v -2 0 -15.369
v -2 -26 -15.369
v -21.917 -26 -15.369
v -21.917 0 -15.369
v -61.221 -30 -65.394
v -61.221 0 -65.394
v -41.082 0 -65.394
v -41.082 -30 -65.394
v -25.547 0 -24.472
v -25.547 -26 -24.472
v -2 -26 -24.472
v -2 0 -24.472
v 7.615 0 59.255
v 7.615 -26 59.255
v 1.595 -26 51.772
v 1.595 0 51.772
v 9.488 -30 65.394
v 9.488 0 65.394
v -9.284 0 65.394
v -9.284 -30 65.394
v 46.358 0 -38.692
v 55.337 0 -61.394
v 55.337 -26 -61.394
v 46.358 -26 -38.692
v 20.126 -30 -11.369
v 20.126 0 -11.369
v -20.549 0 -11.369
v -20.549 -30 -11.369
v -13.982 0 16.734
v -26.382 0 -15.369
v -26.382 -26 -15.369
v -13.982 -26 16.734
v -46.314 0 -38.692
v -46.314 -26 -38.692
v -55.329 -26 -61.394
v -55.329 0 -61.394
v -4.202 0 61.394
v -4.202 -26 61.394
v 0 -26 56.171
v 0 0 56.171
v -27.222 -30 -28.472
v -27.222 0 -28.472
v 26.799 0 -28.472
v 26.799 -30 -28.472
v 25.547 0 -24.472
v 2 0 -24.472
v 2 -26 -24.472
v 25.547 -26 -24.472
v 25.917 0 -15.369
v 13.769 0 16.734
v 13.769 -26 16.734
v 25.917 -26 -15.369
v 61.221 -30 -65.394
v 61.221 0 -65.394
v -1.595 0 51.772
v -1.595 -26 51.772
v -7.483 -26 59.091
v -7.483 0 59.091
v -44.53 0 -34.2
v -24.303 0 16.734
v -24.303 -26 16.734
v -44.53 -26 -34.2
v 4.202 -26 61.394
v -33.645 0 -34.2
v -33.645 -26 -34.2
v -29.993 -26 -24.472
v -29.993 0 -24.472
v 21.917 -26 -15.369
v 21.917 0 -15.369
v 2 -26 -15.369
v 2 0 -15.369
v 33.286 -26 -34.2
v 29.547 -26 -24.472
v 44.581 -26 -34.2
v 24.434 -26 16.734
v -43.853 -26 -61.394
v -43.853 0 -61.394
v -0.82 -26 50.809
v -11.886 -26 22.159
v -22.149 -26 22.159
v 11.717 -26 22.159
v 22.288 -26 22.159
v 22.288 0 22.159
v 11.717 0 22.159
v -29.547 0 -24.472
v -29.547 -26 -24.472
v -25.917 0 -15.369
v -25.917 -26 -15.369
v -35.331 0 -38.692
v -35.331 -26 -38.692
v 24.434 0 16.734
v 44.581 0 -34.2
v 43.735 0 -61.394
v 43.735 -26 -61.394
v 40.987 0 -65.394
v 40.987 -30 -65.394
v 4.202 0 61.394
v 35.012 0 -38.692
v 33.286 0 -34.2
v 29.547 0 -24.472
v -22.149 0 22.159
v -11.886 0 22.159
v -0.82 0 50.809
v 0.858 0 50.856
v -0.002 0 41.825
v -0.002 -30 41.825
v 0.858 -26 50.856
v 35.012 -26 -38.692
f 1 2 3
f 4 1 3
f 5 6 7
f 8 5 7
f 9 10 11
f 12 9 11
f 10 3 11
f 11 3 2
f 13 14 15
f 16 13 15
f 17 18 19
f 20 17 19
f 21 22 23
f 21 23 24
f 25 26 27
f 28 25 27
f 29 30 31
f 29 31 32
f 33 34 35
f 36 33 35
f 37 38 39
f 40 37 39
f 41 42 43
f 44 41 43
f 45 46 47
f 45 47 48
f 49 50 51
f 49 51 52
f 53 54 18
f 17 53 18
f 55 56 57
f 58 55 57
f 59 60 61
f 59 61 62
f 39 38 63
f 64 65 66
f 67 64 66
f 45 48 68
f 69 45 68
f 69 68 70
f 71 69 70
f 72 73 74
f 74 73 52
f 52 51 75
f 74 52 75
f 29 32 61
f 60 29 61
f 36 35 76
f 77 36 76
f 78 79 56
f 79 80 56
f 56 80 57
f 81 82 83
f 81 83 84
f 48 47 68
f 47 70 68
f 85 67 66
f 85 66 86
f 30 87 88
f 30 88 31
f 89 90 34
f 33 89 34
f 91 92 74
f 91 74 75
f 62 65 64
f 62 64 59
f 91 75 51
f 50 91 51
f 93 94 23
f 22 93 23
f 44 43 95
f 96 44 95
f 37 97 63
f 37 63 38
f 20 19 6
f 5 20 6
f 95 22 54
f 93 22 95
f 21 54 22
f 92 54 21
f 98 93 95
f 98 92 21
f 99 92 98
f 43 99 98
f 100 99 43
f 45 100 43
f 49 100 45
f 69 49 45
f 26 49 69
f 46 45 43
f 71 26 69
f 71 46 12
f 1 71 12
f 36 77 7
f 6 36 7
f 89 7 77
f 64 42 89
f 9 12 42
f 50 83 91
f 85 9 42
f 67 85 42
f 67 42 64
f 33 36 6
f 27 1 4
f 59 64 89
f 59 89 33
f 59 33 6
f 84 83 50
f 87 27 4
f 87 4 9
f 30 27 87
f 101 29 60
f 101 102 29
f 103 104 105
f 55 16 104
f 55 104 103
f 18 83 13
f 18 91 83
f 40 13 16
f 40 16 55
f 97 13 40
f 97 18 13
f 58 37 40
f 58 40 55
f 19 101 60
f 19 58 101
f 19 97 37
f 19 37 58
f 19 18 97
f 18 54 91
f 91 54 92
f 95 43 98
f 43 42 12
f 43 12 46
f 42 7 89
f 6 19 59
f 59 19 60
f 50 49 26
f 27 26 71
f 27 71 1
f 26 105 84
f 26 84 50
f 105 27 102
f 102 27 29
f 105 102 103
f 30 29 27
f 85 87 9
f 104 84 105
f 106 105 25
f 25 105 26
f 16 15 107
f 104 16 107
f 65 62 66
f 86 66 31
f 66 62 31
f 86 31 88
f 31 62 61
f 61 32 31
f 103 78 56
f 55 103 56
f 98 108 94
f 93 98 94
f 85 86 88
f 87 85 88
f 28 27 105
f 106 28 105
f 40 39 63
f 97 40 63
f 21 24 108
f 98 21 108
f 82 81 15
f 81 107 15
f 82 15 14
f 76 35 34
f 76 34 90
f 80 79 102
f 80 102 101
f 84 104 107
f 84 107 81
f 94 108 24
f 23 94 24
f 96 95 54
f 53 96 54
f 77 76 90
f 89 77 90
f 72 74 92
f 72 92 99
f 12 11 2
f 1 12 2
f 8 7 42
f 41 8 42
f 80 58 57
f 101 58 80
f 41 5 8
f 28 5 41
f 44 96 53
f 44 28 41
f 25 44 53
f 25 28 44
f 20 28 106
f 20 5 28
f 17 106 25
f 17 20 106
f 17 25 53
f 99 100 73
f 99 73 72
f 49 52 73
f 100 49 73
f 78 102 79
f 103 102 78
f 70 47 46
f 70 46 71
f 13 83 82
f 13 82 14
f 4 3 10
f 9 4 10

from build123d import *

# Parameters (mm, degrees)
F1_DEPTH = 30
F2_T     = -4
F3_W     = 4
F3_H     = 9.103521
F3_W_2   = 14.7409252822
F3_H_2   = 4.4924728572
F3_W_3   = 15.1106659323
F3_H_3   = 5.4243393242
F4_DEPTH = 26


with BuildPart() as f1:
    # F0 (on Front) → F1 (new body)
    with BuildSketch(Plane.XZ):
        Polygon((61.220897, -65.393597), (9.48831, 65.393596), (-9.284015, 65.393596), (-61.220897, -65.393597), (-41.082074, -65.393597), (-27.221939, -28.472164), (26.799398, -28.472164), (40.987162, -65.393597), align=None)
        Polygon((20.12642, -11.368643), (-20.548961, -11.368643), (-0.001722, 41.825181), align=None, mode=Mode.SUBTRACT)
    extrude(amount=F1_DEPTH)

    # F2
    f2_openings = [f1.faces().sort_by_distance(p)[0] for p in [
        (35.565629, 0, -46.290248),
    ]]
    offset(amount=F2_T, openings=f2_openings, kind=Kind.INTERSECTION)

    # F3 (on face) → F4 (join)
    with BuildSketch(Plane(origin=(0, -26, 0), x_dir=(-1, 0, 0), z_dir=(0, 1, 0))):
        Polygon((-21.9167752835, -15.368643), (-25.9167752835, -15.368643), (-29.5474826178, -24.472164), (-25.5474826178, -24.472164), align=None)
        with Locations((0, -19.9204035)):
            Rectangle(F3_W, F3_H)
        with Locations((-40.1606727391, -36.4461746067)):
            Rectangle(F3_W_2, F3_H_2)
        with Locations((-18.0124370381, 19.4464679807)):
            Rectangle(F3_W_3, F3_H_3)
        Polygon((-5.2106779282, 62.6473037582), (-8.3272252852, 60.1398882418), (-1.5950480919, 51.7722487735), (0, 49.7897122204), (1.5950480919, 51.7722487735), (8.3272252852, 60.1398882418), (5.2106779282, 62.6473037582), (0, 56.1707846416), align=None)
        with Locations((18.0124370381, 19.4464679807)):
            Rectangle(F3_W_3, F3_H_3)
        with Locations((40.1606727391, -36.4461746067)):
            Rectangle(F3_W_2, F3_H_2)
        Polygon((25.5474826178, -24.472164), (29.5474826178, -24.472164), (25.9167752835, -15.368643), (21.9167752835, -15.368643), align=None)
    extrude(amount=F4_DEPTH)


solid = f1.part
